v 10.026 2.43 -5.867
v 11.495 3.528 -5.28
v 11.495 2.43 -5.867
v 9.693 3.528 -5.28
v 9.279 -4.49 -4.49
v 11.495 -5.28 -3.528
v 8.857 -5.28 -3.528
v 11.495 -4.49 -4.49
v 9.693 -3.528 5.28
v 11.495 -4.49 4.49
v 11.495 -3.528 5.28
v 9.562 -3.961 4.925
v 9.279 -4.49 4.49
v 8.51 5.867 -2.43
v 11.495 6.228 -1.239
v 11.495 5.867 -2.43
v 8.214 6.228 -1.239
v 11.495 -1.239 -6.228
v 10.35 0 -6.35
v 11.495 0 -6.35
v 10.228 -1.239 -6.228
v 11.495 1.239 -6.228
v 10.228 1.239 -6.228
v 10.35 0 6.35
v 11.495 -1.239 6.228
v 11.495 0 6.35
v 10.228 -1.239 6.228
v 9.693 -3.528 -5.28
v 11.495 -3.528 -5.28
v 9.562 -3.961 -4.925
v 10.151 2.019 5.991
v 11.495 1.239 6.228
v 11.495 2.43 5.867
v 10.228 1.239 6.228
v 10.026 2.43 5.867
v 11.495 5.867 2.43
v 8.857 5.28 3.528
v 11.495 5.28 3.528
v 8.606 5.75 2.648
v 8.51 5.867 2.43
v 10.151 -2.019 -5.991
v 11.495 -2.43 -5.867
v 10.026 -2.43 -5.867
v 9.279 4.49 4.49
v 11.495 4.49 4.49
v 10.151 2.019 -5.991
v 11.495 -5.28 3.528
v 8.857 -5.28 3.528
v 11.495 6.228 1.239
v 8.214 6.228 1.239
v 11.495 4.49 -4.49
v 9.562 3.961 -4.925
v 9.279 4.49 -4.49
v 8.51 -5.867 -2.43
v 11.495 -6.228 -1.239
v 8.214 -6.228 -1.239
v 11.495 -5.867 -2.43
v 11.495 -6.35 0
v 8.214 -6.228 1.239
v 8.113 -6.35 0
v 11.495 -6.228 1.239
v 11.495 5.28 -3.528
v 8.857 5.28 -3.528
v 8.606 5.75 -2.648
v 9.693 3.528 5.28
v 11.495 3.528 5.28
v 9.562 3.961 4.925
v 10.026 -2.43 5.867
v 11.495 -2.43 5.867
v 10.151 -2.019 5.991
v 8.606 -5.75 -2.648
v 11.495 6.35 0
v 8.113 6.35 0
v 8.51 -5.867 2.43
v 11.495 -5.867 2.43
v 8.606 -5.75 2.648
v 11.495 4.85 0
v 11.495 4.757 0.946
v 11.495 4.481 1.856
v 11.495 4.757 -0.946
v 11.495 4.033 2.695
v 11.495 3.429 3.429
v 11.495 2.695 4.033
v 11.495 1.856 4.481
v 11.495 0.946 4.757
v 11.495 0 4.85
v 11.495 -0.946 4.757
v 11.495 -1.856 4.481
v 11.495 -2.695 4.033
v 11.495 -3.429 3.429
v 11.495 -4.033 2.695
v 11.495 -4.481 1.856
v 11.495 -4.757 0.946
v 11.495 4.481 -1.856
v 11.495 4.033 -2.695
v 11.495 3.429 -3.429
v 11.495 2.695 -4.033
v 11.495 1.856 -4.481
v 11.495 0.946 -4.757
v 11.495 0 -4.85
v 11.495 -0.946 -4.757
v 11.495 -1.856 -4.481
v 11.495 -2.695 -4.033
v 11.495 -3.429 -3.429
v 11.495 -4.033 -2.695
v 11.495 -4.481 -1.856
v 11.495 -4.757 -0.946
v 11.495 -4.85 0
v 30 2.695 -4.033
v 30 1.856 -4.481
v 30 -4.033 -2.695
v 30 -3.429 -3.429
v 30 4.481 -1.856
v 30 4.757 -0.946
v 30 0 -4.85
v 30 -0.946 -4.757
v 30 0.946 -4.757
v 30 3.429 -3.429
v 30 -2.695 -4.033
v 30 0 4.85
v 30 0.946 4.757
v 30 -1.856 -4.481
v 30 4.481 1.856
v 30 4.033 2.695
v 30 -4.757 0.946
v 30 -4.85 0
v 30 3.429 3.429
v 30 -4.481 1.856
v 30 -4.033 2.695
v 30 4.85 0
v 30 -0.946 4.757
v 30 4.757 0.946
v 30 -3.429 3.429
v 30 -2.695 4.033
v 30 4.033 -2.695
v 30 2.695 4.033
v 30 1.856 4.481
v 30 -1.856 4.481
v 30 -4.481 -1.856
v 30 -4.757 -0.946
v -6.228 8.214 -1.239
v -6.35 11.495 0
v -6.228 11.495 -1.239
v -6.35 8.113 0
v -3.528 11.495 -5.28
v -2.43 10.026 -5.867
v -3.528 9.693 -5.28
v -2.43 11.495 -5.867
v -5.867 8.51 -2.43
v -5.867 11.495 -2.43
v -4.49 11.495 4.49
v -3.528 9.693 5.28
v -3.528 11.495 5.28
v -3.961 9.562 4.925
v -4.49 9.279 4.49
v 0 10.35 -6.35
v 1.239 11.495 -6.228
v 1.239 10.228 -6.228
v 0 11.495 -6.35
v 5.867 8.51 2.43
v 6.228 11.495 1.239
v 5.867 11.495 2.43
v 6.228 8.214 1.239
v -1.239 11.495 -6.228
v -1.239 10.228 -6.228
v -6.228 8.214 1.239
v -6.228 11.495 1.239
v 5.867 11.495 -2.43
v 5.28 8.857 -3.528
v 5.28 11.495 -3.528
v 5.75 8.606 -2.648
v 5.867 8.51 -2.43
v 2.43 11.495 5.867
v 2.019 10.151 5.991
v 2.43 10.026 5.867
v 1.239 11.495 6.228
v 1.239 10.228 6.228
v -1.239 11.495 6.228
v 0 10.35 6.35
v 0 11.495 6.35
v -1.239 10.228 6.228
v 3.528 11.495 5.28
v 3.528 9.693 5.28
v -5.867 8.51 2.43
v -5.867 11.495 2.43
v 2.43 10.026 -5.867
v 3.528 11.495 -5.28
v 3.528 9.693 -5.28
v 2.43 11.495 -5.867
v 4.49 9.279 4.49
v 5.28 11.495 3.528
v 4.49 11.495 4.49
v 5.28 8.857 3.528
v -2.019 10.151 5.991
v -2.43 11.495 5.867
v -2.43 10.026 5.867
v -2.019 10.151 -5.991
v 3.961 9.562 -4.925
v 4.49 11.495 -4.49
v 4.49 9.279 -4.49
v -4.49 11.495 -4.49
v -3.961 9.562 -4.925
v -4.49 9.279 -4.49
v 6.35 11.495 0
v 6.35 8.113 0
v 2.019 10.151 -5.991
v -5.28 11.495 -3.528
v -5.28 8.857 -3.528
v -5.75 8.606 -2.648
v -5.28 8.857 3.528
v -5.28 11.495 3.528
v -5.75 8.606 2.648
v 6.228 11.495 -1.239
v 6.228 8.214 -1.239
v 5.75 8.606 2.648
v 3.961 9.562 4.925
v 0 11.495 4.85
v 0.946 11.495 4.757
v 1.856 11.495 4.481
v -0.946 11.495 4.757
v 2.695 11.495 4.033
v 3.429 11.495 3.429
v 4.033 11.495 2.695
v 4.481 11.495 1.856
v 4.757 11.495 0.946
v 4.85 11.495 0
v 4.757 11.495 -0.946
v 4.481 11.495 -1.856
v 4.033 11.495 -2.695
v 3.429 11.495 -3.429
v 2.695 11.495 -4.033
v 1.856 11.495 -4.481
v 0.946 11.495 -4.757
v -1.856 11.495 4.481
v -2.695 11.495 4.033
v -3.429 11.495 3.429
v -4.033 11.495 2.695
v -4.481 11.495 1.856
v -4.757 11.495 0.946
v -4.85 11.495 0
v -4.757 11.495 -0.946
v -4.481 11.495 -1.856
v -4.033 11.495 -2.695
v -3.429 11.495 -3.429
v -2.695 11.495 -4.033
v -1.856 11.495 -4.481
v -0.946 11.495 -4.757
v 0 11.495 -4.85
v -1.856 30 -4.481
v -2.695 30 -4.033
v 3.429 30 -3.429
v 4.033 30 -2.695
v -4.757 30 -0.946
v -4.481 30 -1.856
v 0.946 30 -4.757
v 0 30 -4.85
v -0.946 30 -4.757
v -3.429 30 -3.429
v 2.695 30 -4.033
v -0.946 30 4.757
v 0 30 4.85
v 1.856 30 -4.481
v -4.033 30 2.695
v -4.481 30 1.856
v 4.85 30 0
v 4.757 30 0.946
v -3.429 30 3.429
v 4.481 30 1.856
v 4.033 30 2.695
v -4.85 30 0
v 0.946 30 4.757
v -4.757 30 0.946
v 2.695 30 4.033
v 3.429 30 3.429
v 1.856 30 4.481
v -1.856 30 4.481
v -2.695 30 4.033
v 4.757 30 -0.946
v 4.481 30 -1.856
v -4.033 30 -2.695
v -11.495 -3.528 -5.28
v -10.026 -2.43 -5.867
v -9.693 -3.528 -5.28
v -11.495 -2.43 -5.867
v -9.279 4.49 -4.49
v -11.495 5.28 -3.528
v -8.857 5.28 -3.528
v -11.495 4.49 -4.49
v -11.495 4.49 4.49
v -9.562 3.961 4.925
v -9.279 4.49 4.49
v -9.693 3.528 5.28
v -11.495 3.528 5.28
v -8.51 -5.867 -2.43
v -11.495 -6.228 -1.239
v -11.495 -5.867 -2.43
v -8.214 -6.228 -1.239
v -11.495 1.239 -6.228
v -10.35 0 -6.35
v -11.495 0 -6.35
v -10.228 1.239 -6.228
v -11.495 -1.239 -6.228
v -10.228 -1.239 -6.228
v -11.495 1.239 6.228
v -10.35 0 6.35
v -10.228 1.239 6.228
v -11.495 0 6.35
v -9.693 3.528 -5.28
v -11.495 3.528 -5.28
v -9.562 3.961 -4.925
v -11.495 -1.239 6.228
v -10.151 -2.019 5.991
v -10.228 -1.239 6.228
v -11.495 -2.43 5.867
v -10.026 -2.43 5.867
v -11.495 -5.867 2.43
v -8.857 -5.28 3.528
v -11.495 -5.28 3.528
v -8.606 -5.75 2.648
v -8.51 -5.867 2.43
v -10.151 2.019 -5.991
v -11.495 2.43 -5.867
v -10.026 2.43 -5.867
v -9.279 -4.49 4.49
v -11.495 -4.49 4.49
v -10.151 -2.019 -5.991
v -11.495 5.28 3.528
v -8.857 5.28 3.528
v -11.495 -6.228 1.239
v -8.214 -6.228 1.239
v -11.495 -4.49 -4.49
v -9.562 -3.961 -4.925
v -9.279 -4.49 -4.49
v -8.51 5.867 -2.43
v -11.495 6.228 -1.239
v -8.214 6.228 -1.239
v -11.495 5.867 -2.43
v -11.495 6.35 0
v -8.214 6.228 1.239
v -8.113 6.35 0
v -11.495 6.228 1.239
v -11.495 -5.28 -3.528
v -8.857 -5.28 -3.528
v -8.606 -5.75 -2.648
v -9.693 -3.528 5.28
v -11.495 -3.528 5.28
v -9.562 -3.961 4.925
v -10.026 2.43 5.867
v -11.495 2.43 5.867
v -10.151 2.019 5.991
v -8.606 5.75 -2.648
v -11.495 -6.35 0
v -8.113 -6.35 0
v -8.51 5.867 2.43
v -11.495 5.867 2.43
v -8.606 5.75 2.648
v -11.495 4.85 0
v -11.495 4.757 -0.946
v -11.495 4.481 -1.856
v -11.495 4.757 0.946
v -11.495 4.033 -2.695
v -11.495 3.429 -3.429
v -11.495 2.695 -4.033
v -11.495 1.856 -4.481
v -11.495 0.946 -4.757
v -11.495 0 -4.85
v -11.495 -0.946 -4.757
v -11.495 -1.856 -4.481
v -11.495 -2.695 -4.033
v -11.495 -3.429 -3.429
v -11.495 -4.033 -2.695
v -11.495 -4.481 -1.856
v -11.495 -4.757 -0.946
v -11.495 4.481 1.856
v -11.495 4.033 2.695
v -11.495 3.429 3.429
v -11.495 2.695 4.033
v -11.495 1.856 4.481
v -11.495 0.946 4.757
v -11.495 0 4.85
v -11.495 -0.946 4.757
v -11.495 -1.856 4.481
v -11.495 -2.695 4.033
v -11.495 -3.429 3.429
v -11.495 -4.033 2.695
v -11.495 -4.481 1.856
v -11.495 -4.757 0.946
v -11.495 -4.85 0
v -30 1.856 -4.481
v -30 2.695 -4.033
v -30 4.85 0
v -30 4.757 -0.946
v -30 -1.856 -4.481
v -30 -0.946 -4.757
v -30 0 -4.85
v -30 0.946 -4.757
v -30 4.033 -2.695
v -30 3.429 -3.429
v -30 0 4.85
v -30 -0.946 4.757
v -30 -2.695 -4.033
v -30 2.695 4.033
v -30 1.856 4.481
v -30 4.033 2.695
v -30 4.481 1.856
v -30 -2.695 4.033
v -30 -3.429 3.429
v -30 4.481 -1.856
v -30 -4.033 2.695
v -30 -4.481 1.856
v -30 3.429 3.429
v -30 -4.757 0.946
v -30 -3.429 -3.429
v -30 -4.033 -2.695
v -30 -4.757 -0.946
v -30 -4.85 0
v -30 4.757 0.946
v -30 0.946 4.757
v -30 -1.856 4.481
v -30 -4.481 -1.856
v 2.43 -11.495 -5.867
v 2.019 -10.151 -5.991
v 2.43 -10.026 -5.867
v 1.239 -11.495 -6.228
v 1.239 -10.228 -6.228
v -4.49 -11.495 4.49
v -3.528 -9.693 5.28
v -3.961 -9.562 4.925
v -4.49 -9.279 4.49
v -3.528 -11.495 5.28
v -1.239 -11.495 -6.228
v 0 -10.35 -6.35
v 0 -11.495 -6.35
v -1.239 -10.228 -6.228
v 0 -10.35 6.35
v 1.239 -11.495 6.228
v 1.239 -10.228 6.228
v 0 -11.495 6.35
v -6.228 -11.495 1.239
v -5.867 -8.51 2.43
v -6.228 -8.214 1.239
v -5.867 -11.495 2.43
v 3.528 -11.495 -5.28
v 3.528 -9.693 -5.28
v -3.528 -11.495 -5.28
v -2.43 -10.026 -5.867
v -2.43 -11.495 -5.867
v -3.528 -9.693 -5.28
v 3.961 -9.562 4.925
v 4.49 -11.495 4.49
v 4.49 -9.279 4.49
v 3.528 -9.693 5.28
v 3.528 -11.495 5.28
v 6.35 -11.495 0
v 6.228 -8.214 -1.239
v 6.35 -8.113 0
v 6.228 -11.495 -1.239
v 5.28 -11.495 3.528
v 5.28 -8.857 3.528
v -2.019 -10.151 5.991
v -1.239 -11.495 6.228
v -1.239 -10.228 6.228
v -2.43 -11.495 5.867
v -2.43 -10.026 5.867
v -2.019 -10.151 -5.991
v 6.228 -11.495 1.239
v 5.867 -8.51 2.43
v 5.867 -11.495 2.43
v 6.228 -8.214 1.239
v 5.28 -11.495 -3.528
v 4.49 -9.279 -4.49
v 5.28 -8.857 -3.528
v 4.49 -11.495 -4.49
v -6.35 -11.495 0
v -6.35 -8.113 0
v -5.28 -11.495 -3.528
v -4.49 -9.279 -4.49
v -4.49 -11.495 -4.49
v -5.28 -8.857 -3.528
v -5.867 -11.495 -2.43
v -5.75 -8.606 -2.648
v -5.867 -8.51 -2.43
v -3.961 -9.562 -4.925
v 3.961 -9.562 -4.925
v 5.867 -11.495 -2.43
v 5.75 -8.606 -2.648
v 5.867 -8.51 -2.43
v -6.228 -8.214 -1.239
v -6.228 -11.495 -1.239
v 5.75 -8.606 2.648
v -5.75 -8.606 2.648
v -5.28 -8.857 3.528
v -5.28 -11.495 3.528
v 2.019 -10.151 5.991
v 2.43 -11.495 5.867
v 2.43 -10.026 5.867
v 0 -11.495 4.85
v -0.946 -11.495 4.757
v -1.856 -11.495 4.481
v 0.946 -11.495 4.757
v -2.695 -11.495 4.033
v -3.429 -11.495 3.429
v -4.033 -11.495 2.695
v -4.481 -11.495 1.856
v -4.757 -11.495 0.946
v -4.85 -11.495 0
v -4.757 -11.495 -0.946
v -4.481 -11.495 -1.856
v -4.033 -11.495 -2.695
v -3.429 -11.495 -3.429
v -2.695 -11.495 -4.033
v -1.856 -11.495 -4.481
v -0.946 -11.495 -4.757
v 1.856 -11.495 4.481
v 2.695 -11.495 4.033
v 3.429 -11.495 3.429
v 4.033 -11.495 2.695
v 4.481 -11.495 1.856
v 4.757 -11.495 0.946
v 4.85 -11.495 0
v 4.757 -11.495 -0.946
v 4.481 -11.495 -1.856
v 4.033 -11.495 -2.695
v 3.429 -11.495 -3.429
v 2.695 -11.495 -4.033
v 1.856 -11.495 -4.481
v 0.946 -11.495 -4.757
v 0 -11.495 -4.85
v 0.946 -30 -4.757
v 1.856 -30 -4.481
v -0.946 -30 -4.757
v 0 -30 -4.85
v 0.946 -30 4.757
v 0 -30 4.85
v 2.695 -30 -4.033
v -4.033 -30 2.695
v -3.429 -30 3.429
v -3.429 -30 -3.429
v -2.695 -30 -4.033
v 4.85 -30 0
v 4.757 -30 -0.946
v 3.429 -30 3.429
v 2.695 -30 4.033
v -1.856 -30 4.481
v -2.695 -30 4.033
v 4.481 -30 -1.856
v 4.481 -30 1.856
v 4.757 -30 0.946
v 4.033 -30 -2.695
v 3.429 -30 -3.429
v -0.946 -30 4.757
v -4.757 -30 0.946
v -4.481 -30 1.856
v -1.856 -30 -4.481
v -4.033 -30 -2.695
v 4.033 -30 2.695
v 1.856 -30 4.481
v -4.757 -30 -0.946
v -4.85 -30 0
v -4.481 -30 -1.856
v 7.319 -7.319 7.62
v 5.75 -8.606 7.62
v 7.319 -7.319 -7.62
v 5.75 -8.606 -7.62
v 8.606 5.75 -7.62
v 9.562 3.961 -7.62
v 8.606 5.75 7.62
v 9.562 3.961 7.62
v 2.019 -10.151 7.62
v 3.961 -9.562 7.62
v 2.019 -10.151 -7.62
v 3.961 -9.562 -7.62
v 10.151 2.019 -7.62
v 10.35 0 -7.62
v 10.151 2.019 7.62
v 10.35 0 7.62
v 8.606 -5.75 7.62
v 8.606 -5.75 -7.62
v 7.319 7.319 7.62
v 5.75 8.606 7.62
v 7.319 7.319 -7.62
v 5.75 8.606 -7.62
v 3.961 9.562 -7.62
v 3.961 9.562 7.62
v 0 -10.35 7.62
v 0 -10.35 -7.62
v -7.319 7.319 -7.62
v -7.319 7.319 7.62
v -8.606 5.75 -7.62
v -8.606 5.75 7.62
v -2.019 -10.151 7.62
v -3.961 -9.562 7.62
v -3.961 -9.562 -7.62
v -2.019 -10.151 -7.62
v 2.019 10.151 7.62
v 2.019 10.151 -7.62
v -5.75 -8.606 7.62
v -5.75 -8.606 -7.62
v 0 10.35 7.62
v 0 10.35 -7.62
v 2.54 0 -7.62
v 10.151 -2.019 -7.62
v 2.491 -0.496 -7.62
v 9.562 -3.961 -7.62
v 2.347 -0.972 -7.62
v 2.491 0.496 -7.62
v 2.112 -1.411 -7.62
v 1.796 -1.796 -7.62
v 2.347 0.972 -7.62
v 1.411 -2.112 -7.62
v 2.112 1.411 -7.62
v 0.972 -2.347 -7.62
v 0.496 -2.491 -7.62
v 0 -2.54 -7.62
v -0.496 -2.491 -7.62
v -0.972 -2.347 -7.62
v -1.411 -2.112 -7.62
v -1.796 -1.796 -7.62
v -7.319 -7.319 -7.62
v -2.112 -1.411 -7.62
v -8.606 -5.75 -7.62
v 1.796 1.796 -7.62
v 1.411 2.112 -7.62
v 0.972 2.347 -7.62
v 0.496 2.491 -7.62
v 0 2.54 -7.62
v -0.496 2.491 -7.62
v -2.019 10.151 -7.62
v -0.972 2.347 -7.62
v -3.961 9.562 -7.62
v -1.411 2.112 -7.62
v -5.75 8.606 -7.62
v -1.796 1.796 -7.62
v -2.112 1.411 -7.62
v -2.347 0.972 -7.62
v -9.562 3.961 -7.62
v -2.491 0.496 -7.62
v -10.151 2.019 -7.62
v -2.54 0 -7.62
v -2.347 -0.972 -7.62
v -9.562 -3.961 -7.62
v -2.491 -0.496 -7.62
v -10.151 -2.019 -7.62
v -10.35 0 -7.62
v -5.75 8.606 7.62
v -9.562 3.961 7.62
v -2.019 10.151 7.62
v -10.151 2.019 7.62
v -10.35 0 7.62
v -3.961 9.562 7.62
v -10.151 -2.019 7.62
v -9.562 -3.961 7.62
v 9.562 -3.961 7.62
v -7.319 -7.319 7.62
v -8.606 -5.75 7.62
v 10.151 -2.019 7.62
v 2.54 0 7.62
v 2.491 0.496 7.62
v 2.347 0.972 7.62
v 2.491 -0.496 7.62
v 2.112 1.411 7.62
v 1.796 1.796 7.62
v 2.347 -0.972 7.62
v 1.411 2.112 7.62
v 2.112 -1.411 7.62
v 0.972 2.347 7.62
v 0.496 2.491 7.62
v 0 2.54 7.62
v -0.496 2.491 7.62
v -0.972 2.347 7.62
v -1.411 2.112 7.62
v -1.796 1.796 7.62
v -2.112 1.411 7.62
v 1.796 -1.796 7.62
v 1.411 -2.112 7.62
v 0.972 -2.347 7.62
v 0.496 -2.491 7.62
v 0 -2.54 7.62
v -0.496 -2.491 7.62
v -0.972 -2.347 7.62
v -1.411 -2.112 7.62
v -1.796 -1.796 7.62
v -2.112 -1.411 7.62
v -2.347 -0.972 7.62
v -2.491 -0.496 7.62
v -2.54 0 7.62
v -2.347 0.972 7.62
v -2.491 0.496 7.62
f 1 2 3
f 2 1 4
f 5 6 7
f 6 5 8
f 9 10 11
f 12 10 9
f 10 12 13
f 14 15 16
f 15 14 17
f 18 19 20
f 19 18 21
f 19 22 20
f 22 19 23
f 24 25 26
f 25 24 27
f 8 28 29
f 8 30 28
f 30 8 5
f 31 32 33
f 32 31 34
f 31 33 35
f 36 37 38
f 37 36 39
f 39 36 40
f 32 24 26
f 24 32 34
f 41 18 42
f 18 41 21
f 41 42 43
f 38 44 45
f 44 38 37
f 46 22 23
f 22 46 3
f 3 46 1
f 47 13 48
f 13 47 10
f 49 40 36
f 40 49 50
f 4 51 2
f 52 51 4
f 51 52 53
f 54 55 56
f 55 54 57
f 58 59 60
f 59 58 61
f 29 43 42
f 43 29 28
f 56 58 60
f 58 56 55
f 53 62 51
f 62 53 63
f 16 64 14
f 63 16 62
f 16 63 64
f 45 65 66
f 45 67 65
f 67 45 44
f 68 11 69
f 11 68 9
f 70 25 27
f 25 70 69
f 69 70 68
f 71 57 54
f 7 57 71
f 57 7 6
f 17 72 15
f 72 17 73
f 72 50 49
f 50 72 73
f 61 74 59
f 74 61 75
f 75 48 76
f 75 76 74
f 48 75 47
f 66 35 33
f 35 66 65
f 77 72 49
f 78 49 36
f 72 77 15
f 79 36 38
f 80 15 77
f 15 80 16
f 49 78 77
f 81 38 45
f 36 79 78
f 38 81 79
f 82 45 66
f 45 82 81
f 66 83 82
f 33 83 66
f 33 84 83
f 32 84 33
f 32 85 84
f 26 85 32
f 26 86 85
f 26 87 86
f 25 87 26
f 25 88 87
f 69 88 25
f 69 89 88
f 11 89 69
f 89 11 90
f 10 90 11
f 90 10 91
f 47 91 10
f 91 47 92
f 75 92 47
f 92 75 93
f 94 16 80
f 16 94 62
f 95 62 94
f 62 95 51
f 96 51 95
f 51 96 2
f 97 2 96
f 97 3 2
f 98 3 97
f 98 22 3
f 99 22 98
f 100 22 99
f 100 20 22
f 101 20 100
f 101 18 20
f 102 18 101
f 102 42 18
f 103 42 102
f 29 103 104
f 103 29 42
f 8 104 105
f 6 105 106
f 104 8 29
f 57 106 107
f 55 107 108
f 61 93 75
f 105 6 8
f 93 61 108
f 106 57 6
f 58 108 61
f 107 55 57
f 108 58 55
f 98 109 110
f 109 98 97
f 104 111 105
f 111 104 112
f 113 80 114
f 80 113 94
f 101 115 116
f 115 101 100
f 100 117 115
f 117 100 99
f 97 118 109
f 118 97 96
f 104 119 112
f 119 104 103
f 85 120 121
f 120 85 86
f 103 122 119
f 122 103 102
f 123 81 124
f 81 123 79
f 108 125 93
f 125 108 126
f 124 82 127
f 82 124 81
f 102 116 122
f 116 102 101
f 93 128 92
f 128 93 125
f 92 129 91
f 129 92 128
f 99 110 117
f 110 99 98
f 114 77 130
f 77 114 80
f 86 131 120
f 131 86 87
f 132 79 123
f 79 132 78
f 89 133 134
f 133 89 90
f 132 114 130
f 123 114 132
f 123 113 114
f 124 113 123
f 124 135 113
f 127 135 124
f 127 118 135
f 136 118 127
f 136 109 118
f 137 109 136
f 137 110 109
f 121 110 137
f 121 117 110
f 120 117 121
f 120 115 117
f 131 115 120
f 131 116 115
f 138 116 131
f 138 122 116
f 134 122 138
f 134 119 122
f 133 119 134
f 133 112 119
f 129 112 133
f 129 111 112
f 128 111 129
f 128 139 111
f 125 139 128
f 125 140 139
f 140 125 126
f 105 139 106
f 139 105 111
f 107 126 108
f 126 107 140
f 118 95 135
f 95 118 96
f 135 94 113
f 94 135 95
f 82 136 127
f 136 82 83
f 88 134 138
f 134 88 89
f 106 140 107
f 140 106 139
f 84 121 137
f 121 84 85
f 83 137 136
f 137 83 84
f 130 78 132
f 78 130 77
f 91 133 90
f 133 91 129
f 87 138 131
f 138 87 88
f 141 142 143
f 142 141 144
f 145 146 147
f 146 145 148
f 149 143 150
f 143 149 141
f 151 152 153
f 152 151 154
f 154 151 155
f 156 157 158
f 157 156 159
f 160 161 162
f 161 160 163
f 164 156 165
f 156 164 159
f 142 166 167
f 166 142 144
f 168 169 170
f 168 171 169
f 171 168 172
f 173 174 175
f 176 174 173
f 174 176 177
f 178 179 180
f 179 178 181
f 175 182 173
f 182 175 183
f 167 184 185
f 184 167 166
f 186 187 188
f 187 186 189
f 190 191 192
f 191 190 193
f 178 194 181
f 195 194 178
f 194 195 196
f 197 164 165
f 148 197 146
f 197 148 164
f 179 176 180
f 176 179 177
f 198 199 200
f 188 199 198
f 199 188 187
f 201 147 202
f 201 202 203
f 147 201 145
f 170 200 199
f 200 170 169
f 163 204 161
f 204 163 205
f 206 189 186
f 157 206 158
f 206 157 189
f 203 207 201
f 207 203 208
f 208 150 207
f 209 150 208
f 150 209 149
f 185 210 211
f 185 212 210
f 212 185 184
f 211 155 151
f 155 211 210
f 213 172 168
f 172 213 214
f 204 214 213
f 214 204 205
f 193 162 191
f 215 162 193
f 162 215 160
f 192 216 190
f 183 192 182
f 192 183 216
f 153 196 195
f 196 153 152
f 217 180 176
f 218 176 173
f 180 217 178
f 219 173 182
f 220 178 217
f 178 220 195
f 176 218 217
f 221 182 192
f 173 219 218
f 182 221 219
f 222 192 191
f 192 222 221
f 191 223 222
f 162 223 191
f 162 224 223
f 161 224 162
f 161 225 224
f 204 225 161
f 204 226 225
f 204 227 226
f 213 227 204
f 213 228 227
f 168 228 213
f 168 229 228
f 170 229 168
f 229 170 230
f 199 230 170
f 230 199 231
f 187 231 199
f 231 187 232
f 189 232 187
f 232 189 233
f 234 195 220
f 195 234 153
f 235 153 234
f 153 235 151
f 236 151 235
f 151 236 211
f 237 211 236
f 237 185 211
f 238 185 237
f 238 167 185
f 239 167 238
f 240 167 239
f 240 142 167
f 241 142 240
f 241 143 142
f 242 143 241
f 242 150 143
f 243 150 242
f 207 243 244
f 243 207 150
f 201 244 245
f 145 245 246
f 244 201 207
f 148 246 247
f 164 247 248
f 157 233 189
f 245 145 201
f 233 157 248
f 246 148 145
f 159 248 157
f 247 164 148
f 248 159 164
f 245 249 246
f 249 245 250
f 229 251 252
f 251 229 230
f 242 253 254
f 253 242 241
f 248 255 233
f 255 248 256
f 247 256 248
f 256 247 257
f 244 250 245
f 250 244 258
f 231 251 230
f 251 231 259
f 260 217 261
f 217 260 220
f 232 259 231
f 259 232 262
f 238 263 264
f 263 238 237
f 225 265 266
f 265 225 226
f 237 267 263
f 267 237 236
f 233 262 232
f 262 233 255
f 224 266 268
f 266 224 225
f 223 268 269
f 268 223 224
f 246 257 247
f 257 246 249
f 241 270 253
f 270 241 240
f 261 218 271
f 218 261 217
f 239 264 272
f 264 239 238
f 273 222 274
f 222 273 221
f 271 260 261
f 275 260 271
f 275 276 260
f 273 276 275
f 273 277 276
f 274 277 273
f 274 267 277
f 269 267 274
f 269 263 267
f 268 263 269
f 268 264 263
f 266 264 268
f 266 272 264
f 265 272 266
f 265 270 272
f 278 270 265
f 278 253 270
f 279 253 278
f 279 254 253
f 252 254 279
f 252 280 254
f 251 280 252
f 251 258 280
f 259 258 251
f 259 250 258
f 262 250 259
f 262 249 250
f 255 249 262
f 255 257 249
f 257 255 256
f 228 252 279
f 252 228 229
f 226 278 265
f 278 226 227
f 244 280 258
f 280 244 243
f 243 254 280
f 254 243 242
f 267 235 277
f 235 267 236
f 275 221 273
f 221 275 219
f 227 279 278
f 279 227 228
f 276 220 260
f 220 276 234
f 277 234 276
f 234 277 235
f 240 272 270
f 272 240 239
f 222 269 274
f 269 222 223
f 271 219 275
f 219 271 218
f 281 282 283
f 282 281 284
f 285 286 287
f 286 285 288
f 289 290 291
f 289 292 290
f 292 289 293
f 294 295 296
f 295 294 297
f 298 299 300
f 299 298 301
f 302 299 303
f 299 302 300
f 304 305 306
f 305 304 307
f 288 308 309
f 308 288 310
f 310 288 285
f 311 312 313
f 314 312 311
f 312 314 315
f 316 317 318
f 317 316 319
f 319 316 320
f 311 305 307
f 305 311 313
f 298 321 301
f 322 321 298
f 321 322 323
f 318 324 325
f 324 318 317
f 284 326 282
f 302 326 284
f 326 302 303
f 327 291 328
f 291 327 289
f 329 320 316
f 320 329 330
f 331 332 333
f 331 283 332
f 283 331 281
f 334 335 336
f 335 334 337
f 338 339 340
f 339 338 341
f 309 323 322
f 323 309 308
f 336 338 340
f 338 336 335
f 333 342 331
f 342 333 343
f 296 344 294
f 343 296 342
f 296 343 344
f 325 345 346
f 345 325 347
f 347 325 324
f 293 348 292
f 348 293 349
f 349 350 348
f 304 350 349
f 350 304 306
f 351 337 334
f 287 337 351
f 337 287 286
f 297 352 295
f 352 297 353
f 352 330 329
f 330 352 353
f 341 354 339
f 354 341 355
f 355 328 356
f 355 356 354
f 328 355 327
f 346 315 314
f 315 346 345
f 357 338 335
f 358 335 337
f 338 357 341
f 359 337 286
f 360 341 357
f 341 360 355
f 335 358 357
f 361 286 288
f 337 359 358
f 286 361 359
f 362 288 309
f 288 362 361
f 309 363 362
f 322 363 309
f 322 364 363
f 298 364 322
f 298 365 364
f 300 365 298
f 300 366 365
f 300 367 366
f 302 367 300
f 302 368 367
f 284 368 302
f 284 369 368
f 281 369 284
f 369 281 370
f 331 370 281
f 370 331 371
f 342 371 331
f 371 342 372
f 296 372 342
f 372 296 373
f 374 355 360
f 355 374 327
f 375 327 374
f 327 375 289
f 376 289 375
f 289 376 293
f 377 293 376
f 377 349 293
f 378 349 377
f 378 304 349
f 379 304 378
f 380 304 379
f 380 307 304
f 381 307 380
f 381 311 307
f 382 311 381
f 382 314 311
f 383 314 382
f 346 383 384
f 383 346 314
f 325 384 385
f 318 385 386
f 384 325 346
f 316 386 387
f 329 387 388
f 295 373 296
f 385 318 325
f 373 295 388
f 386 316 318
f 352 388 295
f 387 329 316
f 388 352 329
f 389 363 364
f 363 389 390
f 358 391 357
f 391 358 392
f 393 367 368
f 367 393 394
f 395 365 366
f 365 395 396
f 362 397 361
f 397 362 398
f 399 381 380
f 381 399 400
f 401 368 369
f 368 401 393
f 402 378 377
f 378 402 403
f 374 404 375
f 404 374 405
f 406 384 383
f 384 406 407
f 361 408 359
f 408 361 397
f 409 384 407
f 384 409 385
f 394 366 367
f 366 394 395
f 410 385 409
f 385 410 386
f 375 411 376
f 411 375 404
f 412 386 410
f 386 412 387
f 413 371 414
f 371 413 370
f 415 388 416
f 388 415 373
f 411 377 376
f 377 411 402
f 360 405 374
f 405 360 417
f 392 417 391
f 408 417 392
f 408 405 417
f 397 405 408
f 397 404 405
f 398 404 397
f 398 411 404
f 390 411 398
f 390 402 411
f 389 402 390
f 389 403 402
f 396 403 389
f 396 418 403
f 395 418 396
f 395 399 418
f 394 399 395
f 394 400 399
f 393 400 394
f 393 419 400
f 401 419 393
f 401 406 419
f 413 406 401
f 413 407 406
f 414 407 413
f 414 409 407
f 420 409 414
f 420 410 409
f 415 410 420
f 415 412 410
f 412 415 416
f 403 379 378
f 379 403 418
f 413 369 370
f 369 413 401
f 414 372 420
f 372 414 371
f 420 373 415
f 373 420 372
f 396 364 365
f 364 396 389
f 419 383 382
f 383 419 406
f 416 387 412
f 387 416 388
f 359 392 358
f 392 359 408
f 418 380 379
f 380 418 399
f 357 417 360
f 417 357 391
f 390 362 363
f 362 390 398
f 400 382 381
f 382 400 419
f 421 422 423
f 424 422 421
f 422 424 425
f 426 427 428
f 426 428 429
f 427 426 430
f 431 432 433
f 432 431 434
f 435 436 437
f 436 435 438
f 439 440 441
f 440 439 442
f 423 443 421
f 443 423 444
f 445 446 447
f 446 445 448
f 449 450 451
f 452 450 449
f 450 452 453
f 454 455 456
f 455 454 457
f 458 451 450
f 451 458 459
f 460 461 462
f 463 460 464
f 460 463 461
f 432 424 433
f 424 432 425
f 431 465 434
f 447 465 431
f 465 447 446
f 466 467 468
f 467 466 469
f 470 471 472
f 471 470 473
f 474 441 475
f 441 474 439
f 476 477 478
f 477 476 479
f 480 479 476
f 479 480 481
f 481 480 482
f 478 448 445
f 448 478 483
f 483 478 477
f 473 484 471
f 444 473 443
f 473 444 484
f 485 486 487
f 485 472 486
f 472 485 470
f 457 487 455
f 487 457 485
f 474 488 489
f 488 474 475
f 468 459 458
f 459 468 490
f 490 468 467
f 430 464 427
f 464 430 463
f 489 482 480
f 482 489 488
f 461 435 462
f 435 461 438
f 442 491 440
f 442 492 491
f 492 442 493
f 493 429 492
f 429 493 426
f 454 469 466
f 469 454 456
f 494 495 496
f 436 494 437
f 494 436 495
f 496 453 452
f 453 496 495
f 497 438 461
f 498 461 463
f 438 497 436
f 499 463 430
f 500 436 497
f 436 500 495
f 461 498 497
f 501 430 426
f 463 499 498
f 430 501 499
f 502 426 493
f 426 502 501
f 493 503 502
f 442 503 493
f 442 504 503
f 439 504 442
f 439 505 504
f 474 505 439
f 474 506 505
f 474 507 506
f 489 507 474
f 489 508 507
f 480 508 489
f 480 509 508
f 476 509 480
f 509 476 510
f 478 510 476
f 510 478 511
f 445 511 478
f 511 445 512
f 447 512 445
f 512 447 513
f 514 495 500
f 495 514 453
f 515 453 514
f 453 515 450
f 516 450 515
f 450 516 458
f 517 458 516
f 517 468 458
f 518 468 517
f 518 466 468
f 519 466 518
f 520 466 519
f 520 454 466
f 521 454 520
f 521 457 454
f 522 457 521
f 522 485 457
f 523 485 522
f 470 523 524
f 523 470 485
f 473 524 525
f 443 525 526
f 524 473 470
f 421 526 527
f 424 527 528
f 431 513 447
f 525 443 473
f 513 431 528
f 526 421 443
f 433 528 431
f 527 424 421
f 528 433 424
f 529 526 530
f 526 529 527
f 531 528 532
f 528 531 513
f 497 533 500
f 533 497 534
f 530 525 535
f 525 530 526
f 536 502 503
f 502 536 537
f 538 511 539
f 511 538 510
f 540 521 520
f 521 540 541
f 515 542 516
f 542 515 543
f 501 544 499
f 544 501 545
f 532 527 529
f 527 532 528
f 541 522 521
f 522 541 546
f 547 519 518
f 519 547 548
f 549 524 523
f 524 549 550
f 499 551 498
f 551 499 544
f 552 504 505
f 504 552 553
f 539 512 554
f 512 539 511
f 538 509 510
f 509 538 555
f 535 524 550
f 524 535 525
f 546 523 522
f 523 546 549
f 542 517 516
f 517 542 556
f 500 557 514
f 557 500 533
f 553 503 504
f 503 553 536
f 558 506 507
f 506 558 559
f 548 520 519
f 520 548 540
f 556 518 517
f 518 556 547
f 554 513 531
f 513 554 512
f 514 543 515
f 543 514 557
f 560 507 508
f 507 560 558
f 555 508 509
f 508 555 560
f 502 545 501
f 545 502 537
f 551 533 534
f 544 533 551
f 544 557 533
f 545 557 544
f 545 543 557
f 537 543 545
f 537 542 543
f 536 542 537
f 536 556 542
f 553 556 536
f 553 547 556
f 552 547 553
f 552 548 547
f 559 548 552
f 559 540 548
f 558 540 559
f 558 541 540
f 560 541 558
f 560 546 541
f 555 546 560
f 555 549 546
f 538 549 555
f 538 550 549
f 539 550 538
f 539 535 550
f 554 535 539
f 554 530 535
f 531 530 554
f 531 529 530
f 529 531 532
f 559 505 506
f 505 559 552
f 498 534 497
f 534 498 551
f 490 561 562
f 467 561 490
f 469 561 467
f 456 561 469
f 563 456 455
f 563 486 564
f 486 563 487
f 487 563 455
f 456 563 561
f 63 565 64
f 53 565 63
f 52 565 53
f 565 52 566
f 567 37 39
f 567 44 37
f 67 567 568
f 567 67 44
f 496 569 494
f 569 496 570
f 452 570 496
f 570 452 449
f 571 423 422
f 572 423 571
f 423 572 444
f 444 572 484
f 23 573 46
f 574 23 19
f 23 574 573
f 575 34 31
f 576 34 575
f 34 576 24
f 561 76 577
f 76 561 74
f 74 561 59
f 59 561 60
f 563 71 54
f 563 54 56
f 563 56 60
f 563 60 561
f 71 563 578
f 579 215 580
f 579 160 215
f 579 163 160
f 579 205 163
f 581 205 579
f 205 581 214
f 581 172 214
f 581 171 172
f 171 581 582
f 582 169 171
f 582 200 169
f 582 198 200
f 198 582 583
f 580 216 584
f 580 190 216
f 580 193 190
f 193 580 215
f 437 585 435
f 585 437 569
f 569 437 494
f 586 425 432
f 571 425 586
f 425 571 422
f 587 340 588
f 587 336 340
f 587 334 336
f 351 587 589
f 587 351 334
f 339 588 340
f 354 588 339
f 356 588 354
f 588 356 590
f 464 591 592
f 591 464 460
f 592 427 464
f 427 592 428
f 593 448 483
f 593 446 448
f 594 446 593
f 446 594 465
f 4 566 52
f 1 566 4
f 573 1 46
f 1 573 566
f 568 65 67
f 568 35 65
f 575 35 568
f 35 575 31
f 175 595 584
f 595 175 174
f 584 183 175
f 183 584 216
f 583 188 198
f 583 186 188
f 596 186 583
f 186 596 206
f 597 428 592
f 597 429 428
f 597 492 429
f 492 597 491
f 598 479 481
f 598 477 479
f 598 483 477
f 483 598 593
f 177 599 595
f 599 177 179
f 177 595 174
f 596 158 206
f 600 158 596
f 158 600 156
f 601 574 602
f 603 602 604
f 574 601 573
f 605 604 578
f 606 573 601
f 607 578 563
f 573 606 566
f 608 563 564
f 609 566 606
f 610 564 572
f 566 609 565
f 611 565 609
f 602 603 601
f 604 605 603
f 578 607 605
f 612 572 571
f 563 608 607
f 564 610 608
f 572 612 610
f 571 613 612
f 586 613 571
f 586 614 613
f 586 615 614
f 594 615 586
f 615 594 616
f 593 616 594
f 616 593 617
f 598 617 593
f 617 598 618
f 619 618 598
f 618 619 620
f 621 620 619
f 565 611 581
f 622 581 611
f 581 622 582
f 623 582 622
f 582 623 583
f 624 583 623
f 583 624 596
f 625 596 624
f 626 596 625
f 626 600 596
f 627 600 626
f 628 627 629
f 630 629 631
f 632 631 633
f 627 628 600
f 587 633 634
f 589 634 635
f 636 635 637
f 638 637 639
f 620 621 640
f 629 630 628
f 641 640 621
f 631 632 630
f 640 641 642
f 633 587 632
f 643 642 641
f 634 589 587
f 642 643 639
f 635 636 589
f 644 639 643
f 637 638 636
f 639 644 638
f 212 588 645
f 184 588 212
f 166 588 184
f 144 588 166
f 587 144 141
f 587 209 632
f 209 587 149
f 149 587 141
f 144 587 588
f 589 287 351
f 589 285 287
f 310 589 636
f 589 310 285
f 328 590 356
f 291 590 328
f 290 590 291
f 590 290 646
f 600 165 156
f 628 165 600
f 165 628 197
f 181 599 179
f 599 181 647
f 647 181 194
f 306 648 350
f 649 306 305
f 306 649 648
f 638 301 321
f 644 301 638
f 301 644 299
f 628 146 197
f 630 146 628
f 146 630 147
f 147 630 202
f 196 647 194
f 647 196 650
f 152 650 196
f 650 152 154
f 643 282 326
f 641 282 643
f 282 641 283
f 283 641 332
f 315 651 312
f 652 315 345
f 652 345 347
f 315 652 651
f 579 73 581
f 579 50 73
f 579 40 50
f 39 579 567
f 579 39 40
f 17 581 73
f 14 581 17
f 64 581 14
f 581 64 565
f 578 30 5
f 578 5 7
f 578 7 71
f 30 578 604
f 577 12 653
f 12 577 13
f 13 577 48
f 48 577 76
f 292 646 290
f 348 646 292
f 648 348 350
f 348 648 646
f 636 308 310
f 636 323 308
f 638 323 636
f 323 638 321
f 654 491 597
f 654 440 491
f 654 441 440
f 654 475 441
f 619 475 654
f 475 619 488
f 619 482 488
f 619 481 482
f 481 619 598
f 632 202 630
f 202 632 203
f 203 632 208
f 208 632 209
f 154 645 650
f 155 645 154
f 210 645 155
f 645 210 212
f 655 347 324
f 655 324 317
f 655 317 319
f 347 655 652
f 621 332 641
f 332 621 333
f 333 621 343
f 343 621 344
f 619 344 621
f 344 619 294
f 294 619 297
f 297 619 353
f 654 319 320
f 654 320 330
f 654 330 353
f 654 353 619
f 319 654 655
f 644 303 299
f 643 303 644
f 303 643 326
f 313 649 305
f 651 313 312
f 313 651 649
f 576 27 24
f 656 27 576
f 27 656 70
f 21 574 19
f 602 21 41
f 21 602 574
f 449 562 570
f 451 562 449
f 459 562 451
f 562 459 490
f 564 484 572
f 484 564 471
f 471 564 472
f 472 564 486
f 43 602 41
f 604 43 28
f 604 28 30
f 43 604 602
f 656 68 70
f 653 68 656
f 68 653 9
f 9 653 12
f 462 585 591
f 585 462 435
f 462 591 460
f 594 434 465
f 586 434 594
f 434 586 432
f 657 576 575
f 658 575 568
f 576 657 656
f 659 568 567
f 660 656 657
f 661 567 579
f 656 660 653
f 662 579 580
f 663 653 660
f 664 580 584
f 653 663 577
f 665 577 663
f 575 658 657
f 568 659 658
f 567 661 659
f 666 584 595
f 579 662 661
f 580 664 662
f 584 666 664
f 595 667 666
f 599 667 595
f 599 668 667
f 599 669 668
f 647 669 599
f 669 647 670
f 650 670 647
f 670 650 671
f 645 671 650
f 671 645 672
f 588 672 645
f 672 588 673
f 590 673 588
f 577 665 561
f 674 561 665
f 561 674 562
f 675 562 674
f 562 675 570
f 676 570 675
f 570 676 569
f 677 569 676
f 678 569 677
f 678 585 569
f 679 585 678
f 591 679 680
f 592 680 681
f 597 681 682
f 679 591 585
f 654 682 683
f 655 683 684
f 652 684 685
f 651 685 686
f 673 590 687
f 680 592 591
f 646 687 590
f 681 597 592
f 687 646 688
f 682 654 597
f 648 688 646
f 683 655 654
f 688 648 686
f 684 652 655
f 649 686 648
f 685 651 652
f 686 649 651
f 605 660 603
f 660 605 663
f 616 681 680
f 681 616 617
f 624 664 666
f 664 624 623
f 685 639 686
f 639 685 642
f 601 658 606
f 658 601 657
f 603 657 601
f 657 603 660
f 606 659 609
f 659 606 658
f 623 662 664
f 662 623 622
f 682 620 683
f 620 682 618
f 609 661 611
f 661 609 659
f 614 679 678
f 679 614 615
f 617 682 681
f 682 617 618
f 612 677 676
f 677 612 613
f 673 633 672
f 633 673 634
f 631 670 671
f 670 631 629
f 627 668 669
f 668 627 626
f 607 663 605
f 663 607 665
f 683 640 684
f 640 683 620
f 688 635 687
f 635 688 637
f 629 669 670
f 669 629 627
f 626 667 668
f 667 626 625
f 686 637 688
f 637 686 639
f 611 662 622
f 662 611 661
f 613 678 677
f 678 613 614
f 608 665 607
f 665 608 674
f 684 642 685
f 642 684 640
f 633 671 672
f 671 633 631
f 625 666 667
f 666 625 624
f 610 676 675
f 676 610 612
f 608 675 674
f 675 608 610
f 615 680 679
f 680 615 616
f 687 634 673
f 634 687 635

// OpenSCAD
$fn = 32;

// ----------------------------------------------------------------------
// Cardan cross: 60 mm span, 12.7 mm trunnions
// ----------------------------------------------------------------------

// --- parameters (mm) ---
journal_d = 12.7;         // trunnion diameter
arm_len = 30;             // trunnion length from the centre
step_r = 4.32;            // step position from the centre
step_d = 9.7;             // journal diameter after the step
hub_d = 20.7;             // hub diameter
hub_h = 15.24;            // hub height
bore_d = 5.08;            // hub bore

difference() {
  union() {
    /* hub along the joint axis */
    cylinder(h = hub_h, d = hub_d, center = true);
    for (a = [0 : 90 : 270]) rotate([0, 0, a]) {
      /* trunnion, sunk into the hub */
      translate([hub_d / 4, 0, 0]) rotate([0, 90, 0]) cylinder(h = step_r + 2, d = journal_d);
      /* stepped journal out to the tip */
      translate([step_r - 0.5, 0, 0]) rotate([0, 90, 0]) cylinder(h = arm_len + 0.5 - step_r, d = step_d);
    }
  }
  /* lubrication bore through the hub, 2.5 mm clear on both sides */
  translate([0, 0, -hub_h / 2 - 2.5]) cylinder(h = hub_h + 5, d = bore_d);
}
